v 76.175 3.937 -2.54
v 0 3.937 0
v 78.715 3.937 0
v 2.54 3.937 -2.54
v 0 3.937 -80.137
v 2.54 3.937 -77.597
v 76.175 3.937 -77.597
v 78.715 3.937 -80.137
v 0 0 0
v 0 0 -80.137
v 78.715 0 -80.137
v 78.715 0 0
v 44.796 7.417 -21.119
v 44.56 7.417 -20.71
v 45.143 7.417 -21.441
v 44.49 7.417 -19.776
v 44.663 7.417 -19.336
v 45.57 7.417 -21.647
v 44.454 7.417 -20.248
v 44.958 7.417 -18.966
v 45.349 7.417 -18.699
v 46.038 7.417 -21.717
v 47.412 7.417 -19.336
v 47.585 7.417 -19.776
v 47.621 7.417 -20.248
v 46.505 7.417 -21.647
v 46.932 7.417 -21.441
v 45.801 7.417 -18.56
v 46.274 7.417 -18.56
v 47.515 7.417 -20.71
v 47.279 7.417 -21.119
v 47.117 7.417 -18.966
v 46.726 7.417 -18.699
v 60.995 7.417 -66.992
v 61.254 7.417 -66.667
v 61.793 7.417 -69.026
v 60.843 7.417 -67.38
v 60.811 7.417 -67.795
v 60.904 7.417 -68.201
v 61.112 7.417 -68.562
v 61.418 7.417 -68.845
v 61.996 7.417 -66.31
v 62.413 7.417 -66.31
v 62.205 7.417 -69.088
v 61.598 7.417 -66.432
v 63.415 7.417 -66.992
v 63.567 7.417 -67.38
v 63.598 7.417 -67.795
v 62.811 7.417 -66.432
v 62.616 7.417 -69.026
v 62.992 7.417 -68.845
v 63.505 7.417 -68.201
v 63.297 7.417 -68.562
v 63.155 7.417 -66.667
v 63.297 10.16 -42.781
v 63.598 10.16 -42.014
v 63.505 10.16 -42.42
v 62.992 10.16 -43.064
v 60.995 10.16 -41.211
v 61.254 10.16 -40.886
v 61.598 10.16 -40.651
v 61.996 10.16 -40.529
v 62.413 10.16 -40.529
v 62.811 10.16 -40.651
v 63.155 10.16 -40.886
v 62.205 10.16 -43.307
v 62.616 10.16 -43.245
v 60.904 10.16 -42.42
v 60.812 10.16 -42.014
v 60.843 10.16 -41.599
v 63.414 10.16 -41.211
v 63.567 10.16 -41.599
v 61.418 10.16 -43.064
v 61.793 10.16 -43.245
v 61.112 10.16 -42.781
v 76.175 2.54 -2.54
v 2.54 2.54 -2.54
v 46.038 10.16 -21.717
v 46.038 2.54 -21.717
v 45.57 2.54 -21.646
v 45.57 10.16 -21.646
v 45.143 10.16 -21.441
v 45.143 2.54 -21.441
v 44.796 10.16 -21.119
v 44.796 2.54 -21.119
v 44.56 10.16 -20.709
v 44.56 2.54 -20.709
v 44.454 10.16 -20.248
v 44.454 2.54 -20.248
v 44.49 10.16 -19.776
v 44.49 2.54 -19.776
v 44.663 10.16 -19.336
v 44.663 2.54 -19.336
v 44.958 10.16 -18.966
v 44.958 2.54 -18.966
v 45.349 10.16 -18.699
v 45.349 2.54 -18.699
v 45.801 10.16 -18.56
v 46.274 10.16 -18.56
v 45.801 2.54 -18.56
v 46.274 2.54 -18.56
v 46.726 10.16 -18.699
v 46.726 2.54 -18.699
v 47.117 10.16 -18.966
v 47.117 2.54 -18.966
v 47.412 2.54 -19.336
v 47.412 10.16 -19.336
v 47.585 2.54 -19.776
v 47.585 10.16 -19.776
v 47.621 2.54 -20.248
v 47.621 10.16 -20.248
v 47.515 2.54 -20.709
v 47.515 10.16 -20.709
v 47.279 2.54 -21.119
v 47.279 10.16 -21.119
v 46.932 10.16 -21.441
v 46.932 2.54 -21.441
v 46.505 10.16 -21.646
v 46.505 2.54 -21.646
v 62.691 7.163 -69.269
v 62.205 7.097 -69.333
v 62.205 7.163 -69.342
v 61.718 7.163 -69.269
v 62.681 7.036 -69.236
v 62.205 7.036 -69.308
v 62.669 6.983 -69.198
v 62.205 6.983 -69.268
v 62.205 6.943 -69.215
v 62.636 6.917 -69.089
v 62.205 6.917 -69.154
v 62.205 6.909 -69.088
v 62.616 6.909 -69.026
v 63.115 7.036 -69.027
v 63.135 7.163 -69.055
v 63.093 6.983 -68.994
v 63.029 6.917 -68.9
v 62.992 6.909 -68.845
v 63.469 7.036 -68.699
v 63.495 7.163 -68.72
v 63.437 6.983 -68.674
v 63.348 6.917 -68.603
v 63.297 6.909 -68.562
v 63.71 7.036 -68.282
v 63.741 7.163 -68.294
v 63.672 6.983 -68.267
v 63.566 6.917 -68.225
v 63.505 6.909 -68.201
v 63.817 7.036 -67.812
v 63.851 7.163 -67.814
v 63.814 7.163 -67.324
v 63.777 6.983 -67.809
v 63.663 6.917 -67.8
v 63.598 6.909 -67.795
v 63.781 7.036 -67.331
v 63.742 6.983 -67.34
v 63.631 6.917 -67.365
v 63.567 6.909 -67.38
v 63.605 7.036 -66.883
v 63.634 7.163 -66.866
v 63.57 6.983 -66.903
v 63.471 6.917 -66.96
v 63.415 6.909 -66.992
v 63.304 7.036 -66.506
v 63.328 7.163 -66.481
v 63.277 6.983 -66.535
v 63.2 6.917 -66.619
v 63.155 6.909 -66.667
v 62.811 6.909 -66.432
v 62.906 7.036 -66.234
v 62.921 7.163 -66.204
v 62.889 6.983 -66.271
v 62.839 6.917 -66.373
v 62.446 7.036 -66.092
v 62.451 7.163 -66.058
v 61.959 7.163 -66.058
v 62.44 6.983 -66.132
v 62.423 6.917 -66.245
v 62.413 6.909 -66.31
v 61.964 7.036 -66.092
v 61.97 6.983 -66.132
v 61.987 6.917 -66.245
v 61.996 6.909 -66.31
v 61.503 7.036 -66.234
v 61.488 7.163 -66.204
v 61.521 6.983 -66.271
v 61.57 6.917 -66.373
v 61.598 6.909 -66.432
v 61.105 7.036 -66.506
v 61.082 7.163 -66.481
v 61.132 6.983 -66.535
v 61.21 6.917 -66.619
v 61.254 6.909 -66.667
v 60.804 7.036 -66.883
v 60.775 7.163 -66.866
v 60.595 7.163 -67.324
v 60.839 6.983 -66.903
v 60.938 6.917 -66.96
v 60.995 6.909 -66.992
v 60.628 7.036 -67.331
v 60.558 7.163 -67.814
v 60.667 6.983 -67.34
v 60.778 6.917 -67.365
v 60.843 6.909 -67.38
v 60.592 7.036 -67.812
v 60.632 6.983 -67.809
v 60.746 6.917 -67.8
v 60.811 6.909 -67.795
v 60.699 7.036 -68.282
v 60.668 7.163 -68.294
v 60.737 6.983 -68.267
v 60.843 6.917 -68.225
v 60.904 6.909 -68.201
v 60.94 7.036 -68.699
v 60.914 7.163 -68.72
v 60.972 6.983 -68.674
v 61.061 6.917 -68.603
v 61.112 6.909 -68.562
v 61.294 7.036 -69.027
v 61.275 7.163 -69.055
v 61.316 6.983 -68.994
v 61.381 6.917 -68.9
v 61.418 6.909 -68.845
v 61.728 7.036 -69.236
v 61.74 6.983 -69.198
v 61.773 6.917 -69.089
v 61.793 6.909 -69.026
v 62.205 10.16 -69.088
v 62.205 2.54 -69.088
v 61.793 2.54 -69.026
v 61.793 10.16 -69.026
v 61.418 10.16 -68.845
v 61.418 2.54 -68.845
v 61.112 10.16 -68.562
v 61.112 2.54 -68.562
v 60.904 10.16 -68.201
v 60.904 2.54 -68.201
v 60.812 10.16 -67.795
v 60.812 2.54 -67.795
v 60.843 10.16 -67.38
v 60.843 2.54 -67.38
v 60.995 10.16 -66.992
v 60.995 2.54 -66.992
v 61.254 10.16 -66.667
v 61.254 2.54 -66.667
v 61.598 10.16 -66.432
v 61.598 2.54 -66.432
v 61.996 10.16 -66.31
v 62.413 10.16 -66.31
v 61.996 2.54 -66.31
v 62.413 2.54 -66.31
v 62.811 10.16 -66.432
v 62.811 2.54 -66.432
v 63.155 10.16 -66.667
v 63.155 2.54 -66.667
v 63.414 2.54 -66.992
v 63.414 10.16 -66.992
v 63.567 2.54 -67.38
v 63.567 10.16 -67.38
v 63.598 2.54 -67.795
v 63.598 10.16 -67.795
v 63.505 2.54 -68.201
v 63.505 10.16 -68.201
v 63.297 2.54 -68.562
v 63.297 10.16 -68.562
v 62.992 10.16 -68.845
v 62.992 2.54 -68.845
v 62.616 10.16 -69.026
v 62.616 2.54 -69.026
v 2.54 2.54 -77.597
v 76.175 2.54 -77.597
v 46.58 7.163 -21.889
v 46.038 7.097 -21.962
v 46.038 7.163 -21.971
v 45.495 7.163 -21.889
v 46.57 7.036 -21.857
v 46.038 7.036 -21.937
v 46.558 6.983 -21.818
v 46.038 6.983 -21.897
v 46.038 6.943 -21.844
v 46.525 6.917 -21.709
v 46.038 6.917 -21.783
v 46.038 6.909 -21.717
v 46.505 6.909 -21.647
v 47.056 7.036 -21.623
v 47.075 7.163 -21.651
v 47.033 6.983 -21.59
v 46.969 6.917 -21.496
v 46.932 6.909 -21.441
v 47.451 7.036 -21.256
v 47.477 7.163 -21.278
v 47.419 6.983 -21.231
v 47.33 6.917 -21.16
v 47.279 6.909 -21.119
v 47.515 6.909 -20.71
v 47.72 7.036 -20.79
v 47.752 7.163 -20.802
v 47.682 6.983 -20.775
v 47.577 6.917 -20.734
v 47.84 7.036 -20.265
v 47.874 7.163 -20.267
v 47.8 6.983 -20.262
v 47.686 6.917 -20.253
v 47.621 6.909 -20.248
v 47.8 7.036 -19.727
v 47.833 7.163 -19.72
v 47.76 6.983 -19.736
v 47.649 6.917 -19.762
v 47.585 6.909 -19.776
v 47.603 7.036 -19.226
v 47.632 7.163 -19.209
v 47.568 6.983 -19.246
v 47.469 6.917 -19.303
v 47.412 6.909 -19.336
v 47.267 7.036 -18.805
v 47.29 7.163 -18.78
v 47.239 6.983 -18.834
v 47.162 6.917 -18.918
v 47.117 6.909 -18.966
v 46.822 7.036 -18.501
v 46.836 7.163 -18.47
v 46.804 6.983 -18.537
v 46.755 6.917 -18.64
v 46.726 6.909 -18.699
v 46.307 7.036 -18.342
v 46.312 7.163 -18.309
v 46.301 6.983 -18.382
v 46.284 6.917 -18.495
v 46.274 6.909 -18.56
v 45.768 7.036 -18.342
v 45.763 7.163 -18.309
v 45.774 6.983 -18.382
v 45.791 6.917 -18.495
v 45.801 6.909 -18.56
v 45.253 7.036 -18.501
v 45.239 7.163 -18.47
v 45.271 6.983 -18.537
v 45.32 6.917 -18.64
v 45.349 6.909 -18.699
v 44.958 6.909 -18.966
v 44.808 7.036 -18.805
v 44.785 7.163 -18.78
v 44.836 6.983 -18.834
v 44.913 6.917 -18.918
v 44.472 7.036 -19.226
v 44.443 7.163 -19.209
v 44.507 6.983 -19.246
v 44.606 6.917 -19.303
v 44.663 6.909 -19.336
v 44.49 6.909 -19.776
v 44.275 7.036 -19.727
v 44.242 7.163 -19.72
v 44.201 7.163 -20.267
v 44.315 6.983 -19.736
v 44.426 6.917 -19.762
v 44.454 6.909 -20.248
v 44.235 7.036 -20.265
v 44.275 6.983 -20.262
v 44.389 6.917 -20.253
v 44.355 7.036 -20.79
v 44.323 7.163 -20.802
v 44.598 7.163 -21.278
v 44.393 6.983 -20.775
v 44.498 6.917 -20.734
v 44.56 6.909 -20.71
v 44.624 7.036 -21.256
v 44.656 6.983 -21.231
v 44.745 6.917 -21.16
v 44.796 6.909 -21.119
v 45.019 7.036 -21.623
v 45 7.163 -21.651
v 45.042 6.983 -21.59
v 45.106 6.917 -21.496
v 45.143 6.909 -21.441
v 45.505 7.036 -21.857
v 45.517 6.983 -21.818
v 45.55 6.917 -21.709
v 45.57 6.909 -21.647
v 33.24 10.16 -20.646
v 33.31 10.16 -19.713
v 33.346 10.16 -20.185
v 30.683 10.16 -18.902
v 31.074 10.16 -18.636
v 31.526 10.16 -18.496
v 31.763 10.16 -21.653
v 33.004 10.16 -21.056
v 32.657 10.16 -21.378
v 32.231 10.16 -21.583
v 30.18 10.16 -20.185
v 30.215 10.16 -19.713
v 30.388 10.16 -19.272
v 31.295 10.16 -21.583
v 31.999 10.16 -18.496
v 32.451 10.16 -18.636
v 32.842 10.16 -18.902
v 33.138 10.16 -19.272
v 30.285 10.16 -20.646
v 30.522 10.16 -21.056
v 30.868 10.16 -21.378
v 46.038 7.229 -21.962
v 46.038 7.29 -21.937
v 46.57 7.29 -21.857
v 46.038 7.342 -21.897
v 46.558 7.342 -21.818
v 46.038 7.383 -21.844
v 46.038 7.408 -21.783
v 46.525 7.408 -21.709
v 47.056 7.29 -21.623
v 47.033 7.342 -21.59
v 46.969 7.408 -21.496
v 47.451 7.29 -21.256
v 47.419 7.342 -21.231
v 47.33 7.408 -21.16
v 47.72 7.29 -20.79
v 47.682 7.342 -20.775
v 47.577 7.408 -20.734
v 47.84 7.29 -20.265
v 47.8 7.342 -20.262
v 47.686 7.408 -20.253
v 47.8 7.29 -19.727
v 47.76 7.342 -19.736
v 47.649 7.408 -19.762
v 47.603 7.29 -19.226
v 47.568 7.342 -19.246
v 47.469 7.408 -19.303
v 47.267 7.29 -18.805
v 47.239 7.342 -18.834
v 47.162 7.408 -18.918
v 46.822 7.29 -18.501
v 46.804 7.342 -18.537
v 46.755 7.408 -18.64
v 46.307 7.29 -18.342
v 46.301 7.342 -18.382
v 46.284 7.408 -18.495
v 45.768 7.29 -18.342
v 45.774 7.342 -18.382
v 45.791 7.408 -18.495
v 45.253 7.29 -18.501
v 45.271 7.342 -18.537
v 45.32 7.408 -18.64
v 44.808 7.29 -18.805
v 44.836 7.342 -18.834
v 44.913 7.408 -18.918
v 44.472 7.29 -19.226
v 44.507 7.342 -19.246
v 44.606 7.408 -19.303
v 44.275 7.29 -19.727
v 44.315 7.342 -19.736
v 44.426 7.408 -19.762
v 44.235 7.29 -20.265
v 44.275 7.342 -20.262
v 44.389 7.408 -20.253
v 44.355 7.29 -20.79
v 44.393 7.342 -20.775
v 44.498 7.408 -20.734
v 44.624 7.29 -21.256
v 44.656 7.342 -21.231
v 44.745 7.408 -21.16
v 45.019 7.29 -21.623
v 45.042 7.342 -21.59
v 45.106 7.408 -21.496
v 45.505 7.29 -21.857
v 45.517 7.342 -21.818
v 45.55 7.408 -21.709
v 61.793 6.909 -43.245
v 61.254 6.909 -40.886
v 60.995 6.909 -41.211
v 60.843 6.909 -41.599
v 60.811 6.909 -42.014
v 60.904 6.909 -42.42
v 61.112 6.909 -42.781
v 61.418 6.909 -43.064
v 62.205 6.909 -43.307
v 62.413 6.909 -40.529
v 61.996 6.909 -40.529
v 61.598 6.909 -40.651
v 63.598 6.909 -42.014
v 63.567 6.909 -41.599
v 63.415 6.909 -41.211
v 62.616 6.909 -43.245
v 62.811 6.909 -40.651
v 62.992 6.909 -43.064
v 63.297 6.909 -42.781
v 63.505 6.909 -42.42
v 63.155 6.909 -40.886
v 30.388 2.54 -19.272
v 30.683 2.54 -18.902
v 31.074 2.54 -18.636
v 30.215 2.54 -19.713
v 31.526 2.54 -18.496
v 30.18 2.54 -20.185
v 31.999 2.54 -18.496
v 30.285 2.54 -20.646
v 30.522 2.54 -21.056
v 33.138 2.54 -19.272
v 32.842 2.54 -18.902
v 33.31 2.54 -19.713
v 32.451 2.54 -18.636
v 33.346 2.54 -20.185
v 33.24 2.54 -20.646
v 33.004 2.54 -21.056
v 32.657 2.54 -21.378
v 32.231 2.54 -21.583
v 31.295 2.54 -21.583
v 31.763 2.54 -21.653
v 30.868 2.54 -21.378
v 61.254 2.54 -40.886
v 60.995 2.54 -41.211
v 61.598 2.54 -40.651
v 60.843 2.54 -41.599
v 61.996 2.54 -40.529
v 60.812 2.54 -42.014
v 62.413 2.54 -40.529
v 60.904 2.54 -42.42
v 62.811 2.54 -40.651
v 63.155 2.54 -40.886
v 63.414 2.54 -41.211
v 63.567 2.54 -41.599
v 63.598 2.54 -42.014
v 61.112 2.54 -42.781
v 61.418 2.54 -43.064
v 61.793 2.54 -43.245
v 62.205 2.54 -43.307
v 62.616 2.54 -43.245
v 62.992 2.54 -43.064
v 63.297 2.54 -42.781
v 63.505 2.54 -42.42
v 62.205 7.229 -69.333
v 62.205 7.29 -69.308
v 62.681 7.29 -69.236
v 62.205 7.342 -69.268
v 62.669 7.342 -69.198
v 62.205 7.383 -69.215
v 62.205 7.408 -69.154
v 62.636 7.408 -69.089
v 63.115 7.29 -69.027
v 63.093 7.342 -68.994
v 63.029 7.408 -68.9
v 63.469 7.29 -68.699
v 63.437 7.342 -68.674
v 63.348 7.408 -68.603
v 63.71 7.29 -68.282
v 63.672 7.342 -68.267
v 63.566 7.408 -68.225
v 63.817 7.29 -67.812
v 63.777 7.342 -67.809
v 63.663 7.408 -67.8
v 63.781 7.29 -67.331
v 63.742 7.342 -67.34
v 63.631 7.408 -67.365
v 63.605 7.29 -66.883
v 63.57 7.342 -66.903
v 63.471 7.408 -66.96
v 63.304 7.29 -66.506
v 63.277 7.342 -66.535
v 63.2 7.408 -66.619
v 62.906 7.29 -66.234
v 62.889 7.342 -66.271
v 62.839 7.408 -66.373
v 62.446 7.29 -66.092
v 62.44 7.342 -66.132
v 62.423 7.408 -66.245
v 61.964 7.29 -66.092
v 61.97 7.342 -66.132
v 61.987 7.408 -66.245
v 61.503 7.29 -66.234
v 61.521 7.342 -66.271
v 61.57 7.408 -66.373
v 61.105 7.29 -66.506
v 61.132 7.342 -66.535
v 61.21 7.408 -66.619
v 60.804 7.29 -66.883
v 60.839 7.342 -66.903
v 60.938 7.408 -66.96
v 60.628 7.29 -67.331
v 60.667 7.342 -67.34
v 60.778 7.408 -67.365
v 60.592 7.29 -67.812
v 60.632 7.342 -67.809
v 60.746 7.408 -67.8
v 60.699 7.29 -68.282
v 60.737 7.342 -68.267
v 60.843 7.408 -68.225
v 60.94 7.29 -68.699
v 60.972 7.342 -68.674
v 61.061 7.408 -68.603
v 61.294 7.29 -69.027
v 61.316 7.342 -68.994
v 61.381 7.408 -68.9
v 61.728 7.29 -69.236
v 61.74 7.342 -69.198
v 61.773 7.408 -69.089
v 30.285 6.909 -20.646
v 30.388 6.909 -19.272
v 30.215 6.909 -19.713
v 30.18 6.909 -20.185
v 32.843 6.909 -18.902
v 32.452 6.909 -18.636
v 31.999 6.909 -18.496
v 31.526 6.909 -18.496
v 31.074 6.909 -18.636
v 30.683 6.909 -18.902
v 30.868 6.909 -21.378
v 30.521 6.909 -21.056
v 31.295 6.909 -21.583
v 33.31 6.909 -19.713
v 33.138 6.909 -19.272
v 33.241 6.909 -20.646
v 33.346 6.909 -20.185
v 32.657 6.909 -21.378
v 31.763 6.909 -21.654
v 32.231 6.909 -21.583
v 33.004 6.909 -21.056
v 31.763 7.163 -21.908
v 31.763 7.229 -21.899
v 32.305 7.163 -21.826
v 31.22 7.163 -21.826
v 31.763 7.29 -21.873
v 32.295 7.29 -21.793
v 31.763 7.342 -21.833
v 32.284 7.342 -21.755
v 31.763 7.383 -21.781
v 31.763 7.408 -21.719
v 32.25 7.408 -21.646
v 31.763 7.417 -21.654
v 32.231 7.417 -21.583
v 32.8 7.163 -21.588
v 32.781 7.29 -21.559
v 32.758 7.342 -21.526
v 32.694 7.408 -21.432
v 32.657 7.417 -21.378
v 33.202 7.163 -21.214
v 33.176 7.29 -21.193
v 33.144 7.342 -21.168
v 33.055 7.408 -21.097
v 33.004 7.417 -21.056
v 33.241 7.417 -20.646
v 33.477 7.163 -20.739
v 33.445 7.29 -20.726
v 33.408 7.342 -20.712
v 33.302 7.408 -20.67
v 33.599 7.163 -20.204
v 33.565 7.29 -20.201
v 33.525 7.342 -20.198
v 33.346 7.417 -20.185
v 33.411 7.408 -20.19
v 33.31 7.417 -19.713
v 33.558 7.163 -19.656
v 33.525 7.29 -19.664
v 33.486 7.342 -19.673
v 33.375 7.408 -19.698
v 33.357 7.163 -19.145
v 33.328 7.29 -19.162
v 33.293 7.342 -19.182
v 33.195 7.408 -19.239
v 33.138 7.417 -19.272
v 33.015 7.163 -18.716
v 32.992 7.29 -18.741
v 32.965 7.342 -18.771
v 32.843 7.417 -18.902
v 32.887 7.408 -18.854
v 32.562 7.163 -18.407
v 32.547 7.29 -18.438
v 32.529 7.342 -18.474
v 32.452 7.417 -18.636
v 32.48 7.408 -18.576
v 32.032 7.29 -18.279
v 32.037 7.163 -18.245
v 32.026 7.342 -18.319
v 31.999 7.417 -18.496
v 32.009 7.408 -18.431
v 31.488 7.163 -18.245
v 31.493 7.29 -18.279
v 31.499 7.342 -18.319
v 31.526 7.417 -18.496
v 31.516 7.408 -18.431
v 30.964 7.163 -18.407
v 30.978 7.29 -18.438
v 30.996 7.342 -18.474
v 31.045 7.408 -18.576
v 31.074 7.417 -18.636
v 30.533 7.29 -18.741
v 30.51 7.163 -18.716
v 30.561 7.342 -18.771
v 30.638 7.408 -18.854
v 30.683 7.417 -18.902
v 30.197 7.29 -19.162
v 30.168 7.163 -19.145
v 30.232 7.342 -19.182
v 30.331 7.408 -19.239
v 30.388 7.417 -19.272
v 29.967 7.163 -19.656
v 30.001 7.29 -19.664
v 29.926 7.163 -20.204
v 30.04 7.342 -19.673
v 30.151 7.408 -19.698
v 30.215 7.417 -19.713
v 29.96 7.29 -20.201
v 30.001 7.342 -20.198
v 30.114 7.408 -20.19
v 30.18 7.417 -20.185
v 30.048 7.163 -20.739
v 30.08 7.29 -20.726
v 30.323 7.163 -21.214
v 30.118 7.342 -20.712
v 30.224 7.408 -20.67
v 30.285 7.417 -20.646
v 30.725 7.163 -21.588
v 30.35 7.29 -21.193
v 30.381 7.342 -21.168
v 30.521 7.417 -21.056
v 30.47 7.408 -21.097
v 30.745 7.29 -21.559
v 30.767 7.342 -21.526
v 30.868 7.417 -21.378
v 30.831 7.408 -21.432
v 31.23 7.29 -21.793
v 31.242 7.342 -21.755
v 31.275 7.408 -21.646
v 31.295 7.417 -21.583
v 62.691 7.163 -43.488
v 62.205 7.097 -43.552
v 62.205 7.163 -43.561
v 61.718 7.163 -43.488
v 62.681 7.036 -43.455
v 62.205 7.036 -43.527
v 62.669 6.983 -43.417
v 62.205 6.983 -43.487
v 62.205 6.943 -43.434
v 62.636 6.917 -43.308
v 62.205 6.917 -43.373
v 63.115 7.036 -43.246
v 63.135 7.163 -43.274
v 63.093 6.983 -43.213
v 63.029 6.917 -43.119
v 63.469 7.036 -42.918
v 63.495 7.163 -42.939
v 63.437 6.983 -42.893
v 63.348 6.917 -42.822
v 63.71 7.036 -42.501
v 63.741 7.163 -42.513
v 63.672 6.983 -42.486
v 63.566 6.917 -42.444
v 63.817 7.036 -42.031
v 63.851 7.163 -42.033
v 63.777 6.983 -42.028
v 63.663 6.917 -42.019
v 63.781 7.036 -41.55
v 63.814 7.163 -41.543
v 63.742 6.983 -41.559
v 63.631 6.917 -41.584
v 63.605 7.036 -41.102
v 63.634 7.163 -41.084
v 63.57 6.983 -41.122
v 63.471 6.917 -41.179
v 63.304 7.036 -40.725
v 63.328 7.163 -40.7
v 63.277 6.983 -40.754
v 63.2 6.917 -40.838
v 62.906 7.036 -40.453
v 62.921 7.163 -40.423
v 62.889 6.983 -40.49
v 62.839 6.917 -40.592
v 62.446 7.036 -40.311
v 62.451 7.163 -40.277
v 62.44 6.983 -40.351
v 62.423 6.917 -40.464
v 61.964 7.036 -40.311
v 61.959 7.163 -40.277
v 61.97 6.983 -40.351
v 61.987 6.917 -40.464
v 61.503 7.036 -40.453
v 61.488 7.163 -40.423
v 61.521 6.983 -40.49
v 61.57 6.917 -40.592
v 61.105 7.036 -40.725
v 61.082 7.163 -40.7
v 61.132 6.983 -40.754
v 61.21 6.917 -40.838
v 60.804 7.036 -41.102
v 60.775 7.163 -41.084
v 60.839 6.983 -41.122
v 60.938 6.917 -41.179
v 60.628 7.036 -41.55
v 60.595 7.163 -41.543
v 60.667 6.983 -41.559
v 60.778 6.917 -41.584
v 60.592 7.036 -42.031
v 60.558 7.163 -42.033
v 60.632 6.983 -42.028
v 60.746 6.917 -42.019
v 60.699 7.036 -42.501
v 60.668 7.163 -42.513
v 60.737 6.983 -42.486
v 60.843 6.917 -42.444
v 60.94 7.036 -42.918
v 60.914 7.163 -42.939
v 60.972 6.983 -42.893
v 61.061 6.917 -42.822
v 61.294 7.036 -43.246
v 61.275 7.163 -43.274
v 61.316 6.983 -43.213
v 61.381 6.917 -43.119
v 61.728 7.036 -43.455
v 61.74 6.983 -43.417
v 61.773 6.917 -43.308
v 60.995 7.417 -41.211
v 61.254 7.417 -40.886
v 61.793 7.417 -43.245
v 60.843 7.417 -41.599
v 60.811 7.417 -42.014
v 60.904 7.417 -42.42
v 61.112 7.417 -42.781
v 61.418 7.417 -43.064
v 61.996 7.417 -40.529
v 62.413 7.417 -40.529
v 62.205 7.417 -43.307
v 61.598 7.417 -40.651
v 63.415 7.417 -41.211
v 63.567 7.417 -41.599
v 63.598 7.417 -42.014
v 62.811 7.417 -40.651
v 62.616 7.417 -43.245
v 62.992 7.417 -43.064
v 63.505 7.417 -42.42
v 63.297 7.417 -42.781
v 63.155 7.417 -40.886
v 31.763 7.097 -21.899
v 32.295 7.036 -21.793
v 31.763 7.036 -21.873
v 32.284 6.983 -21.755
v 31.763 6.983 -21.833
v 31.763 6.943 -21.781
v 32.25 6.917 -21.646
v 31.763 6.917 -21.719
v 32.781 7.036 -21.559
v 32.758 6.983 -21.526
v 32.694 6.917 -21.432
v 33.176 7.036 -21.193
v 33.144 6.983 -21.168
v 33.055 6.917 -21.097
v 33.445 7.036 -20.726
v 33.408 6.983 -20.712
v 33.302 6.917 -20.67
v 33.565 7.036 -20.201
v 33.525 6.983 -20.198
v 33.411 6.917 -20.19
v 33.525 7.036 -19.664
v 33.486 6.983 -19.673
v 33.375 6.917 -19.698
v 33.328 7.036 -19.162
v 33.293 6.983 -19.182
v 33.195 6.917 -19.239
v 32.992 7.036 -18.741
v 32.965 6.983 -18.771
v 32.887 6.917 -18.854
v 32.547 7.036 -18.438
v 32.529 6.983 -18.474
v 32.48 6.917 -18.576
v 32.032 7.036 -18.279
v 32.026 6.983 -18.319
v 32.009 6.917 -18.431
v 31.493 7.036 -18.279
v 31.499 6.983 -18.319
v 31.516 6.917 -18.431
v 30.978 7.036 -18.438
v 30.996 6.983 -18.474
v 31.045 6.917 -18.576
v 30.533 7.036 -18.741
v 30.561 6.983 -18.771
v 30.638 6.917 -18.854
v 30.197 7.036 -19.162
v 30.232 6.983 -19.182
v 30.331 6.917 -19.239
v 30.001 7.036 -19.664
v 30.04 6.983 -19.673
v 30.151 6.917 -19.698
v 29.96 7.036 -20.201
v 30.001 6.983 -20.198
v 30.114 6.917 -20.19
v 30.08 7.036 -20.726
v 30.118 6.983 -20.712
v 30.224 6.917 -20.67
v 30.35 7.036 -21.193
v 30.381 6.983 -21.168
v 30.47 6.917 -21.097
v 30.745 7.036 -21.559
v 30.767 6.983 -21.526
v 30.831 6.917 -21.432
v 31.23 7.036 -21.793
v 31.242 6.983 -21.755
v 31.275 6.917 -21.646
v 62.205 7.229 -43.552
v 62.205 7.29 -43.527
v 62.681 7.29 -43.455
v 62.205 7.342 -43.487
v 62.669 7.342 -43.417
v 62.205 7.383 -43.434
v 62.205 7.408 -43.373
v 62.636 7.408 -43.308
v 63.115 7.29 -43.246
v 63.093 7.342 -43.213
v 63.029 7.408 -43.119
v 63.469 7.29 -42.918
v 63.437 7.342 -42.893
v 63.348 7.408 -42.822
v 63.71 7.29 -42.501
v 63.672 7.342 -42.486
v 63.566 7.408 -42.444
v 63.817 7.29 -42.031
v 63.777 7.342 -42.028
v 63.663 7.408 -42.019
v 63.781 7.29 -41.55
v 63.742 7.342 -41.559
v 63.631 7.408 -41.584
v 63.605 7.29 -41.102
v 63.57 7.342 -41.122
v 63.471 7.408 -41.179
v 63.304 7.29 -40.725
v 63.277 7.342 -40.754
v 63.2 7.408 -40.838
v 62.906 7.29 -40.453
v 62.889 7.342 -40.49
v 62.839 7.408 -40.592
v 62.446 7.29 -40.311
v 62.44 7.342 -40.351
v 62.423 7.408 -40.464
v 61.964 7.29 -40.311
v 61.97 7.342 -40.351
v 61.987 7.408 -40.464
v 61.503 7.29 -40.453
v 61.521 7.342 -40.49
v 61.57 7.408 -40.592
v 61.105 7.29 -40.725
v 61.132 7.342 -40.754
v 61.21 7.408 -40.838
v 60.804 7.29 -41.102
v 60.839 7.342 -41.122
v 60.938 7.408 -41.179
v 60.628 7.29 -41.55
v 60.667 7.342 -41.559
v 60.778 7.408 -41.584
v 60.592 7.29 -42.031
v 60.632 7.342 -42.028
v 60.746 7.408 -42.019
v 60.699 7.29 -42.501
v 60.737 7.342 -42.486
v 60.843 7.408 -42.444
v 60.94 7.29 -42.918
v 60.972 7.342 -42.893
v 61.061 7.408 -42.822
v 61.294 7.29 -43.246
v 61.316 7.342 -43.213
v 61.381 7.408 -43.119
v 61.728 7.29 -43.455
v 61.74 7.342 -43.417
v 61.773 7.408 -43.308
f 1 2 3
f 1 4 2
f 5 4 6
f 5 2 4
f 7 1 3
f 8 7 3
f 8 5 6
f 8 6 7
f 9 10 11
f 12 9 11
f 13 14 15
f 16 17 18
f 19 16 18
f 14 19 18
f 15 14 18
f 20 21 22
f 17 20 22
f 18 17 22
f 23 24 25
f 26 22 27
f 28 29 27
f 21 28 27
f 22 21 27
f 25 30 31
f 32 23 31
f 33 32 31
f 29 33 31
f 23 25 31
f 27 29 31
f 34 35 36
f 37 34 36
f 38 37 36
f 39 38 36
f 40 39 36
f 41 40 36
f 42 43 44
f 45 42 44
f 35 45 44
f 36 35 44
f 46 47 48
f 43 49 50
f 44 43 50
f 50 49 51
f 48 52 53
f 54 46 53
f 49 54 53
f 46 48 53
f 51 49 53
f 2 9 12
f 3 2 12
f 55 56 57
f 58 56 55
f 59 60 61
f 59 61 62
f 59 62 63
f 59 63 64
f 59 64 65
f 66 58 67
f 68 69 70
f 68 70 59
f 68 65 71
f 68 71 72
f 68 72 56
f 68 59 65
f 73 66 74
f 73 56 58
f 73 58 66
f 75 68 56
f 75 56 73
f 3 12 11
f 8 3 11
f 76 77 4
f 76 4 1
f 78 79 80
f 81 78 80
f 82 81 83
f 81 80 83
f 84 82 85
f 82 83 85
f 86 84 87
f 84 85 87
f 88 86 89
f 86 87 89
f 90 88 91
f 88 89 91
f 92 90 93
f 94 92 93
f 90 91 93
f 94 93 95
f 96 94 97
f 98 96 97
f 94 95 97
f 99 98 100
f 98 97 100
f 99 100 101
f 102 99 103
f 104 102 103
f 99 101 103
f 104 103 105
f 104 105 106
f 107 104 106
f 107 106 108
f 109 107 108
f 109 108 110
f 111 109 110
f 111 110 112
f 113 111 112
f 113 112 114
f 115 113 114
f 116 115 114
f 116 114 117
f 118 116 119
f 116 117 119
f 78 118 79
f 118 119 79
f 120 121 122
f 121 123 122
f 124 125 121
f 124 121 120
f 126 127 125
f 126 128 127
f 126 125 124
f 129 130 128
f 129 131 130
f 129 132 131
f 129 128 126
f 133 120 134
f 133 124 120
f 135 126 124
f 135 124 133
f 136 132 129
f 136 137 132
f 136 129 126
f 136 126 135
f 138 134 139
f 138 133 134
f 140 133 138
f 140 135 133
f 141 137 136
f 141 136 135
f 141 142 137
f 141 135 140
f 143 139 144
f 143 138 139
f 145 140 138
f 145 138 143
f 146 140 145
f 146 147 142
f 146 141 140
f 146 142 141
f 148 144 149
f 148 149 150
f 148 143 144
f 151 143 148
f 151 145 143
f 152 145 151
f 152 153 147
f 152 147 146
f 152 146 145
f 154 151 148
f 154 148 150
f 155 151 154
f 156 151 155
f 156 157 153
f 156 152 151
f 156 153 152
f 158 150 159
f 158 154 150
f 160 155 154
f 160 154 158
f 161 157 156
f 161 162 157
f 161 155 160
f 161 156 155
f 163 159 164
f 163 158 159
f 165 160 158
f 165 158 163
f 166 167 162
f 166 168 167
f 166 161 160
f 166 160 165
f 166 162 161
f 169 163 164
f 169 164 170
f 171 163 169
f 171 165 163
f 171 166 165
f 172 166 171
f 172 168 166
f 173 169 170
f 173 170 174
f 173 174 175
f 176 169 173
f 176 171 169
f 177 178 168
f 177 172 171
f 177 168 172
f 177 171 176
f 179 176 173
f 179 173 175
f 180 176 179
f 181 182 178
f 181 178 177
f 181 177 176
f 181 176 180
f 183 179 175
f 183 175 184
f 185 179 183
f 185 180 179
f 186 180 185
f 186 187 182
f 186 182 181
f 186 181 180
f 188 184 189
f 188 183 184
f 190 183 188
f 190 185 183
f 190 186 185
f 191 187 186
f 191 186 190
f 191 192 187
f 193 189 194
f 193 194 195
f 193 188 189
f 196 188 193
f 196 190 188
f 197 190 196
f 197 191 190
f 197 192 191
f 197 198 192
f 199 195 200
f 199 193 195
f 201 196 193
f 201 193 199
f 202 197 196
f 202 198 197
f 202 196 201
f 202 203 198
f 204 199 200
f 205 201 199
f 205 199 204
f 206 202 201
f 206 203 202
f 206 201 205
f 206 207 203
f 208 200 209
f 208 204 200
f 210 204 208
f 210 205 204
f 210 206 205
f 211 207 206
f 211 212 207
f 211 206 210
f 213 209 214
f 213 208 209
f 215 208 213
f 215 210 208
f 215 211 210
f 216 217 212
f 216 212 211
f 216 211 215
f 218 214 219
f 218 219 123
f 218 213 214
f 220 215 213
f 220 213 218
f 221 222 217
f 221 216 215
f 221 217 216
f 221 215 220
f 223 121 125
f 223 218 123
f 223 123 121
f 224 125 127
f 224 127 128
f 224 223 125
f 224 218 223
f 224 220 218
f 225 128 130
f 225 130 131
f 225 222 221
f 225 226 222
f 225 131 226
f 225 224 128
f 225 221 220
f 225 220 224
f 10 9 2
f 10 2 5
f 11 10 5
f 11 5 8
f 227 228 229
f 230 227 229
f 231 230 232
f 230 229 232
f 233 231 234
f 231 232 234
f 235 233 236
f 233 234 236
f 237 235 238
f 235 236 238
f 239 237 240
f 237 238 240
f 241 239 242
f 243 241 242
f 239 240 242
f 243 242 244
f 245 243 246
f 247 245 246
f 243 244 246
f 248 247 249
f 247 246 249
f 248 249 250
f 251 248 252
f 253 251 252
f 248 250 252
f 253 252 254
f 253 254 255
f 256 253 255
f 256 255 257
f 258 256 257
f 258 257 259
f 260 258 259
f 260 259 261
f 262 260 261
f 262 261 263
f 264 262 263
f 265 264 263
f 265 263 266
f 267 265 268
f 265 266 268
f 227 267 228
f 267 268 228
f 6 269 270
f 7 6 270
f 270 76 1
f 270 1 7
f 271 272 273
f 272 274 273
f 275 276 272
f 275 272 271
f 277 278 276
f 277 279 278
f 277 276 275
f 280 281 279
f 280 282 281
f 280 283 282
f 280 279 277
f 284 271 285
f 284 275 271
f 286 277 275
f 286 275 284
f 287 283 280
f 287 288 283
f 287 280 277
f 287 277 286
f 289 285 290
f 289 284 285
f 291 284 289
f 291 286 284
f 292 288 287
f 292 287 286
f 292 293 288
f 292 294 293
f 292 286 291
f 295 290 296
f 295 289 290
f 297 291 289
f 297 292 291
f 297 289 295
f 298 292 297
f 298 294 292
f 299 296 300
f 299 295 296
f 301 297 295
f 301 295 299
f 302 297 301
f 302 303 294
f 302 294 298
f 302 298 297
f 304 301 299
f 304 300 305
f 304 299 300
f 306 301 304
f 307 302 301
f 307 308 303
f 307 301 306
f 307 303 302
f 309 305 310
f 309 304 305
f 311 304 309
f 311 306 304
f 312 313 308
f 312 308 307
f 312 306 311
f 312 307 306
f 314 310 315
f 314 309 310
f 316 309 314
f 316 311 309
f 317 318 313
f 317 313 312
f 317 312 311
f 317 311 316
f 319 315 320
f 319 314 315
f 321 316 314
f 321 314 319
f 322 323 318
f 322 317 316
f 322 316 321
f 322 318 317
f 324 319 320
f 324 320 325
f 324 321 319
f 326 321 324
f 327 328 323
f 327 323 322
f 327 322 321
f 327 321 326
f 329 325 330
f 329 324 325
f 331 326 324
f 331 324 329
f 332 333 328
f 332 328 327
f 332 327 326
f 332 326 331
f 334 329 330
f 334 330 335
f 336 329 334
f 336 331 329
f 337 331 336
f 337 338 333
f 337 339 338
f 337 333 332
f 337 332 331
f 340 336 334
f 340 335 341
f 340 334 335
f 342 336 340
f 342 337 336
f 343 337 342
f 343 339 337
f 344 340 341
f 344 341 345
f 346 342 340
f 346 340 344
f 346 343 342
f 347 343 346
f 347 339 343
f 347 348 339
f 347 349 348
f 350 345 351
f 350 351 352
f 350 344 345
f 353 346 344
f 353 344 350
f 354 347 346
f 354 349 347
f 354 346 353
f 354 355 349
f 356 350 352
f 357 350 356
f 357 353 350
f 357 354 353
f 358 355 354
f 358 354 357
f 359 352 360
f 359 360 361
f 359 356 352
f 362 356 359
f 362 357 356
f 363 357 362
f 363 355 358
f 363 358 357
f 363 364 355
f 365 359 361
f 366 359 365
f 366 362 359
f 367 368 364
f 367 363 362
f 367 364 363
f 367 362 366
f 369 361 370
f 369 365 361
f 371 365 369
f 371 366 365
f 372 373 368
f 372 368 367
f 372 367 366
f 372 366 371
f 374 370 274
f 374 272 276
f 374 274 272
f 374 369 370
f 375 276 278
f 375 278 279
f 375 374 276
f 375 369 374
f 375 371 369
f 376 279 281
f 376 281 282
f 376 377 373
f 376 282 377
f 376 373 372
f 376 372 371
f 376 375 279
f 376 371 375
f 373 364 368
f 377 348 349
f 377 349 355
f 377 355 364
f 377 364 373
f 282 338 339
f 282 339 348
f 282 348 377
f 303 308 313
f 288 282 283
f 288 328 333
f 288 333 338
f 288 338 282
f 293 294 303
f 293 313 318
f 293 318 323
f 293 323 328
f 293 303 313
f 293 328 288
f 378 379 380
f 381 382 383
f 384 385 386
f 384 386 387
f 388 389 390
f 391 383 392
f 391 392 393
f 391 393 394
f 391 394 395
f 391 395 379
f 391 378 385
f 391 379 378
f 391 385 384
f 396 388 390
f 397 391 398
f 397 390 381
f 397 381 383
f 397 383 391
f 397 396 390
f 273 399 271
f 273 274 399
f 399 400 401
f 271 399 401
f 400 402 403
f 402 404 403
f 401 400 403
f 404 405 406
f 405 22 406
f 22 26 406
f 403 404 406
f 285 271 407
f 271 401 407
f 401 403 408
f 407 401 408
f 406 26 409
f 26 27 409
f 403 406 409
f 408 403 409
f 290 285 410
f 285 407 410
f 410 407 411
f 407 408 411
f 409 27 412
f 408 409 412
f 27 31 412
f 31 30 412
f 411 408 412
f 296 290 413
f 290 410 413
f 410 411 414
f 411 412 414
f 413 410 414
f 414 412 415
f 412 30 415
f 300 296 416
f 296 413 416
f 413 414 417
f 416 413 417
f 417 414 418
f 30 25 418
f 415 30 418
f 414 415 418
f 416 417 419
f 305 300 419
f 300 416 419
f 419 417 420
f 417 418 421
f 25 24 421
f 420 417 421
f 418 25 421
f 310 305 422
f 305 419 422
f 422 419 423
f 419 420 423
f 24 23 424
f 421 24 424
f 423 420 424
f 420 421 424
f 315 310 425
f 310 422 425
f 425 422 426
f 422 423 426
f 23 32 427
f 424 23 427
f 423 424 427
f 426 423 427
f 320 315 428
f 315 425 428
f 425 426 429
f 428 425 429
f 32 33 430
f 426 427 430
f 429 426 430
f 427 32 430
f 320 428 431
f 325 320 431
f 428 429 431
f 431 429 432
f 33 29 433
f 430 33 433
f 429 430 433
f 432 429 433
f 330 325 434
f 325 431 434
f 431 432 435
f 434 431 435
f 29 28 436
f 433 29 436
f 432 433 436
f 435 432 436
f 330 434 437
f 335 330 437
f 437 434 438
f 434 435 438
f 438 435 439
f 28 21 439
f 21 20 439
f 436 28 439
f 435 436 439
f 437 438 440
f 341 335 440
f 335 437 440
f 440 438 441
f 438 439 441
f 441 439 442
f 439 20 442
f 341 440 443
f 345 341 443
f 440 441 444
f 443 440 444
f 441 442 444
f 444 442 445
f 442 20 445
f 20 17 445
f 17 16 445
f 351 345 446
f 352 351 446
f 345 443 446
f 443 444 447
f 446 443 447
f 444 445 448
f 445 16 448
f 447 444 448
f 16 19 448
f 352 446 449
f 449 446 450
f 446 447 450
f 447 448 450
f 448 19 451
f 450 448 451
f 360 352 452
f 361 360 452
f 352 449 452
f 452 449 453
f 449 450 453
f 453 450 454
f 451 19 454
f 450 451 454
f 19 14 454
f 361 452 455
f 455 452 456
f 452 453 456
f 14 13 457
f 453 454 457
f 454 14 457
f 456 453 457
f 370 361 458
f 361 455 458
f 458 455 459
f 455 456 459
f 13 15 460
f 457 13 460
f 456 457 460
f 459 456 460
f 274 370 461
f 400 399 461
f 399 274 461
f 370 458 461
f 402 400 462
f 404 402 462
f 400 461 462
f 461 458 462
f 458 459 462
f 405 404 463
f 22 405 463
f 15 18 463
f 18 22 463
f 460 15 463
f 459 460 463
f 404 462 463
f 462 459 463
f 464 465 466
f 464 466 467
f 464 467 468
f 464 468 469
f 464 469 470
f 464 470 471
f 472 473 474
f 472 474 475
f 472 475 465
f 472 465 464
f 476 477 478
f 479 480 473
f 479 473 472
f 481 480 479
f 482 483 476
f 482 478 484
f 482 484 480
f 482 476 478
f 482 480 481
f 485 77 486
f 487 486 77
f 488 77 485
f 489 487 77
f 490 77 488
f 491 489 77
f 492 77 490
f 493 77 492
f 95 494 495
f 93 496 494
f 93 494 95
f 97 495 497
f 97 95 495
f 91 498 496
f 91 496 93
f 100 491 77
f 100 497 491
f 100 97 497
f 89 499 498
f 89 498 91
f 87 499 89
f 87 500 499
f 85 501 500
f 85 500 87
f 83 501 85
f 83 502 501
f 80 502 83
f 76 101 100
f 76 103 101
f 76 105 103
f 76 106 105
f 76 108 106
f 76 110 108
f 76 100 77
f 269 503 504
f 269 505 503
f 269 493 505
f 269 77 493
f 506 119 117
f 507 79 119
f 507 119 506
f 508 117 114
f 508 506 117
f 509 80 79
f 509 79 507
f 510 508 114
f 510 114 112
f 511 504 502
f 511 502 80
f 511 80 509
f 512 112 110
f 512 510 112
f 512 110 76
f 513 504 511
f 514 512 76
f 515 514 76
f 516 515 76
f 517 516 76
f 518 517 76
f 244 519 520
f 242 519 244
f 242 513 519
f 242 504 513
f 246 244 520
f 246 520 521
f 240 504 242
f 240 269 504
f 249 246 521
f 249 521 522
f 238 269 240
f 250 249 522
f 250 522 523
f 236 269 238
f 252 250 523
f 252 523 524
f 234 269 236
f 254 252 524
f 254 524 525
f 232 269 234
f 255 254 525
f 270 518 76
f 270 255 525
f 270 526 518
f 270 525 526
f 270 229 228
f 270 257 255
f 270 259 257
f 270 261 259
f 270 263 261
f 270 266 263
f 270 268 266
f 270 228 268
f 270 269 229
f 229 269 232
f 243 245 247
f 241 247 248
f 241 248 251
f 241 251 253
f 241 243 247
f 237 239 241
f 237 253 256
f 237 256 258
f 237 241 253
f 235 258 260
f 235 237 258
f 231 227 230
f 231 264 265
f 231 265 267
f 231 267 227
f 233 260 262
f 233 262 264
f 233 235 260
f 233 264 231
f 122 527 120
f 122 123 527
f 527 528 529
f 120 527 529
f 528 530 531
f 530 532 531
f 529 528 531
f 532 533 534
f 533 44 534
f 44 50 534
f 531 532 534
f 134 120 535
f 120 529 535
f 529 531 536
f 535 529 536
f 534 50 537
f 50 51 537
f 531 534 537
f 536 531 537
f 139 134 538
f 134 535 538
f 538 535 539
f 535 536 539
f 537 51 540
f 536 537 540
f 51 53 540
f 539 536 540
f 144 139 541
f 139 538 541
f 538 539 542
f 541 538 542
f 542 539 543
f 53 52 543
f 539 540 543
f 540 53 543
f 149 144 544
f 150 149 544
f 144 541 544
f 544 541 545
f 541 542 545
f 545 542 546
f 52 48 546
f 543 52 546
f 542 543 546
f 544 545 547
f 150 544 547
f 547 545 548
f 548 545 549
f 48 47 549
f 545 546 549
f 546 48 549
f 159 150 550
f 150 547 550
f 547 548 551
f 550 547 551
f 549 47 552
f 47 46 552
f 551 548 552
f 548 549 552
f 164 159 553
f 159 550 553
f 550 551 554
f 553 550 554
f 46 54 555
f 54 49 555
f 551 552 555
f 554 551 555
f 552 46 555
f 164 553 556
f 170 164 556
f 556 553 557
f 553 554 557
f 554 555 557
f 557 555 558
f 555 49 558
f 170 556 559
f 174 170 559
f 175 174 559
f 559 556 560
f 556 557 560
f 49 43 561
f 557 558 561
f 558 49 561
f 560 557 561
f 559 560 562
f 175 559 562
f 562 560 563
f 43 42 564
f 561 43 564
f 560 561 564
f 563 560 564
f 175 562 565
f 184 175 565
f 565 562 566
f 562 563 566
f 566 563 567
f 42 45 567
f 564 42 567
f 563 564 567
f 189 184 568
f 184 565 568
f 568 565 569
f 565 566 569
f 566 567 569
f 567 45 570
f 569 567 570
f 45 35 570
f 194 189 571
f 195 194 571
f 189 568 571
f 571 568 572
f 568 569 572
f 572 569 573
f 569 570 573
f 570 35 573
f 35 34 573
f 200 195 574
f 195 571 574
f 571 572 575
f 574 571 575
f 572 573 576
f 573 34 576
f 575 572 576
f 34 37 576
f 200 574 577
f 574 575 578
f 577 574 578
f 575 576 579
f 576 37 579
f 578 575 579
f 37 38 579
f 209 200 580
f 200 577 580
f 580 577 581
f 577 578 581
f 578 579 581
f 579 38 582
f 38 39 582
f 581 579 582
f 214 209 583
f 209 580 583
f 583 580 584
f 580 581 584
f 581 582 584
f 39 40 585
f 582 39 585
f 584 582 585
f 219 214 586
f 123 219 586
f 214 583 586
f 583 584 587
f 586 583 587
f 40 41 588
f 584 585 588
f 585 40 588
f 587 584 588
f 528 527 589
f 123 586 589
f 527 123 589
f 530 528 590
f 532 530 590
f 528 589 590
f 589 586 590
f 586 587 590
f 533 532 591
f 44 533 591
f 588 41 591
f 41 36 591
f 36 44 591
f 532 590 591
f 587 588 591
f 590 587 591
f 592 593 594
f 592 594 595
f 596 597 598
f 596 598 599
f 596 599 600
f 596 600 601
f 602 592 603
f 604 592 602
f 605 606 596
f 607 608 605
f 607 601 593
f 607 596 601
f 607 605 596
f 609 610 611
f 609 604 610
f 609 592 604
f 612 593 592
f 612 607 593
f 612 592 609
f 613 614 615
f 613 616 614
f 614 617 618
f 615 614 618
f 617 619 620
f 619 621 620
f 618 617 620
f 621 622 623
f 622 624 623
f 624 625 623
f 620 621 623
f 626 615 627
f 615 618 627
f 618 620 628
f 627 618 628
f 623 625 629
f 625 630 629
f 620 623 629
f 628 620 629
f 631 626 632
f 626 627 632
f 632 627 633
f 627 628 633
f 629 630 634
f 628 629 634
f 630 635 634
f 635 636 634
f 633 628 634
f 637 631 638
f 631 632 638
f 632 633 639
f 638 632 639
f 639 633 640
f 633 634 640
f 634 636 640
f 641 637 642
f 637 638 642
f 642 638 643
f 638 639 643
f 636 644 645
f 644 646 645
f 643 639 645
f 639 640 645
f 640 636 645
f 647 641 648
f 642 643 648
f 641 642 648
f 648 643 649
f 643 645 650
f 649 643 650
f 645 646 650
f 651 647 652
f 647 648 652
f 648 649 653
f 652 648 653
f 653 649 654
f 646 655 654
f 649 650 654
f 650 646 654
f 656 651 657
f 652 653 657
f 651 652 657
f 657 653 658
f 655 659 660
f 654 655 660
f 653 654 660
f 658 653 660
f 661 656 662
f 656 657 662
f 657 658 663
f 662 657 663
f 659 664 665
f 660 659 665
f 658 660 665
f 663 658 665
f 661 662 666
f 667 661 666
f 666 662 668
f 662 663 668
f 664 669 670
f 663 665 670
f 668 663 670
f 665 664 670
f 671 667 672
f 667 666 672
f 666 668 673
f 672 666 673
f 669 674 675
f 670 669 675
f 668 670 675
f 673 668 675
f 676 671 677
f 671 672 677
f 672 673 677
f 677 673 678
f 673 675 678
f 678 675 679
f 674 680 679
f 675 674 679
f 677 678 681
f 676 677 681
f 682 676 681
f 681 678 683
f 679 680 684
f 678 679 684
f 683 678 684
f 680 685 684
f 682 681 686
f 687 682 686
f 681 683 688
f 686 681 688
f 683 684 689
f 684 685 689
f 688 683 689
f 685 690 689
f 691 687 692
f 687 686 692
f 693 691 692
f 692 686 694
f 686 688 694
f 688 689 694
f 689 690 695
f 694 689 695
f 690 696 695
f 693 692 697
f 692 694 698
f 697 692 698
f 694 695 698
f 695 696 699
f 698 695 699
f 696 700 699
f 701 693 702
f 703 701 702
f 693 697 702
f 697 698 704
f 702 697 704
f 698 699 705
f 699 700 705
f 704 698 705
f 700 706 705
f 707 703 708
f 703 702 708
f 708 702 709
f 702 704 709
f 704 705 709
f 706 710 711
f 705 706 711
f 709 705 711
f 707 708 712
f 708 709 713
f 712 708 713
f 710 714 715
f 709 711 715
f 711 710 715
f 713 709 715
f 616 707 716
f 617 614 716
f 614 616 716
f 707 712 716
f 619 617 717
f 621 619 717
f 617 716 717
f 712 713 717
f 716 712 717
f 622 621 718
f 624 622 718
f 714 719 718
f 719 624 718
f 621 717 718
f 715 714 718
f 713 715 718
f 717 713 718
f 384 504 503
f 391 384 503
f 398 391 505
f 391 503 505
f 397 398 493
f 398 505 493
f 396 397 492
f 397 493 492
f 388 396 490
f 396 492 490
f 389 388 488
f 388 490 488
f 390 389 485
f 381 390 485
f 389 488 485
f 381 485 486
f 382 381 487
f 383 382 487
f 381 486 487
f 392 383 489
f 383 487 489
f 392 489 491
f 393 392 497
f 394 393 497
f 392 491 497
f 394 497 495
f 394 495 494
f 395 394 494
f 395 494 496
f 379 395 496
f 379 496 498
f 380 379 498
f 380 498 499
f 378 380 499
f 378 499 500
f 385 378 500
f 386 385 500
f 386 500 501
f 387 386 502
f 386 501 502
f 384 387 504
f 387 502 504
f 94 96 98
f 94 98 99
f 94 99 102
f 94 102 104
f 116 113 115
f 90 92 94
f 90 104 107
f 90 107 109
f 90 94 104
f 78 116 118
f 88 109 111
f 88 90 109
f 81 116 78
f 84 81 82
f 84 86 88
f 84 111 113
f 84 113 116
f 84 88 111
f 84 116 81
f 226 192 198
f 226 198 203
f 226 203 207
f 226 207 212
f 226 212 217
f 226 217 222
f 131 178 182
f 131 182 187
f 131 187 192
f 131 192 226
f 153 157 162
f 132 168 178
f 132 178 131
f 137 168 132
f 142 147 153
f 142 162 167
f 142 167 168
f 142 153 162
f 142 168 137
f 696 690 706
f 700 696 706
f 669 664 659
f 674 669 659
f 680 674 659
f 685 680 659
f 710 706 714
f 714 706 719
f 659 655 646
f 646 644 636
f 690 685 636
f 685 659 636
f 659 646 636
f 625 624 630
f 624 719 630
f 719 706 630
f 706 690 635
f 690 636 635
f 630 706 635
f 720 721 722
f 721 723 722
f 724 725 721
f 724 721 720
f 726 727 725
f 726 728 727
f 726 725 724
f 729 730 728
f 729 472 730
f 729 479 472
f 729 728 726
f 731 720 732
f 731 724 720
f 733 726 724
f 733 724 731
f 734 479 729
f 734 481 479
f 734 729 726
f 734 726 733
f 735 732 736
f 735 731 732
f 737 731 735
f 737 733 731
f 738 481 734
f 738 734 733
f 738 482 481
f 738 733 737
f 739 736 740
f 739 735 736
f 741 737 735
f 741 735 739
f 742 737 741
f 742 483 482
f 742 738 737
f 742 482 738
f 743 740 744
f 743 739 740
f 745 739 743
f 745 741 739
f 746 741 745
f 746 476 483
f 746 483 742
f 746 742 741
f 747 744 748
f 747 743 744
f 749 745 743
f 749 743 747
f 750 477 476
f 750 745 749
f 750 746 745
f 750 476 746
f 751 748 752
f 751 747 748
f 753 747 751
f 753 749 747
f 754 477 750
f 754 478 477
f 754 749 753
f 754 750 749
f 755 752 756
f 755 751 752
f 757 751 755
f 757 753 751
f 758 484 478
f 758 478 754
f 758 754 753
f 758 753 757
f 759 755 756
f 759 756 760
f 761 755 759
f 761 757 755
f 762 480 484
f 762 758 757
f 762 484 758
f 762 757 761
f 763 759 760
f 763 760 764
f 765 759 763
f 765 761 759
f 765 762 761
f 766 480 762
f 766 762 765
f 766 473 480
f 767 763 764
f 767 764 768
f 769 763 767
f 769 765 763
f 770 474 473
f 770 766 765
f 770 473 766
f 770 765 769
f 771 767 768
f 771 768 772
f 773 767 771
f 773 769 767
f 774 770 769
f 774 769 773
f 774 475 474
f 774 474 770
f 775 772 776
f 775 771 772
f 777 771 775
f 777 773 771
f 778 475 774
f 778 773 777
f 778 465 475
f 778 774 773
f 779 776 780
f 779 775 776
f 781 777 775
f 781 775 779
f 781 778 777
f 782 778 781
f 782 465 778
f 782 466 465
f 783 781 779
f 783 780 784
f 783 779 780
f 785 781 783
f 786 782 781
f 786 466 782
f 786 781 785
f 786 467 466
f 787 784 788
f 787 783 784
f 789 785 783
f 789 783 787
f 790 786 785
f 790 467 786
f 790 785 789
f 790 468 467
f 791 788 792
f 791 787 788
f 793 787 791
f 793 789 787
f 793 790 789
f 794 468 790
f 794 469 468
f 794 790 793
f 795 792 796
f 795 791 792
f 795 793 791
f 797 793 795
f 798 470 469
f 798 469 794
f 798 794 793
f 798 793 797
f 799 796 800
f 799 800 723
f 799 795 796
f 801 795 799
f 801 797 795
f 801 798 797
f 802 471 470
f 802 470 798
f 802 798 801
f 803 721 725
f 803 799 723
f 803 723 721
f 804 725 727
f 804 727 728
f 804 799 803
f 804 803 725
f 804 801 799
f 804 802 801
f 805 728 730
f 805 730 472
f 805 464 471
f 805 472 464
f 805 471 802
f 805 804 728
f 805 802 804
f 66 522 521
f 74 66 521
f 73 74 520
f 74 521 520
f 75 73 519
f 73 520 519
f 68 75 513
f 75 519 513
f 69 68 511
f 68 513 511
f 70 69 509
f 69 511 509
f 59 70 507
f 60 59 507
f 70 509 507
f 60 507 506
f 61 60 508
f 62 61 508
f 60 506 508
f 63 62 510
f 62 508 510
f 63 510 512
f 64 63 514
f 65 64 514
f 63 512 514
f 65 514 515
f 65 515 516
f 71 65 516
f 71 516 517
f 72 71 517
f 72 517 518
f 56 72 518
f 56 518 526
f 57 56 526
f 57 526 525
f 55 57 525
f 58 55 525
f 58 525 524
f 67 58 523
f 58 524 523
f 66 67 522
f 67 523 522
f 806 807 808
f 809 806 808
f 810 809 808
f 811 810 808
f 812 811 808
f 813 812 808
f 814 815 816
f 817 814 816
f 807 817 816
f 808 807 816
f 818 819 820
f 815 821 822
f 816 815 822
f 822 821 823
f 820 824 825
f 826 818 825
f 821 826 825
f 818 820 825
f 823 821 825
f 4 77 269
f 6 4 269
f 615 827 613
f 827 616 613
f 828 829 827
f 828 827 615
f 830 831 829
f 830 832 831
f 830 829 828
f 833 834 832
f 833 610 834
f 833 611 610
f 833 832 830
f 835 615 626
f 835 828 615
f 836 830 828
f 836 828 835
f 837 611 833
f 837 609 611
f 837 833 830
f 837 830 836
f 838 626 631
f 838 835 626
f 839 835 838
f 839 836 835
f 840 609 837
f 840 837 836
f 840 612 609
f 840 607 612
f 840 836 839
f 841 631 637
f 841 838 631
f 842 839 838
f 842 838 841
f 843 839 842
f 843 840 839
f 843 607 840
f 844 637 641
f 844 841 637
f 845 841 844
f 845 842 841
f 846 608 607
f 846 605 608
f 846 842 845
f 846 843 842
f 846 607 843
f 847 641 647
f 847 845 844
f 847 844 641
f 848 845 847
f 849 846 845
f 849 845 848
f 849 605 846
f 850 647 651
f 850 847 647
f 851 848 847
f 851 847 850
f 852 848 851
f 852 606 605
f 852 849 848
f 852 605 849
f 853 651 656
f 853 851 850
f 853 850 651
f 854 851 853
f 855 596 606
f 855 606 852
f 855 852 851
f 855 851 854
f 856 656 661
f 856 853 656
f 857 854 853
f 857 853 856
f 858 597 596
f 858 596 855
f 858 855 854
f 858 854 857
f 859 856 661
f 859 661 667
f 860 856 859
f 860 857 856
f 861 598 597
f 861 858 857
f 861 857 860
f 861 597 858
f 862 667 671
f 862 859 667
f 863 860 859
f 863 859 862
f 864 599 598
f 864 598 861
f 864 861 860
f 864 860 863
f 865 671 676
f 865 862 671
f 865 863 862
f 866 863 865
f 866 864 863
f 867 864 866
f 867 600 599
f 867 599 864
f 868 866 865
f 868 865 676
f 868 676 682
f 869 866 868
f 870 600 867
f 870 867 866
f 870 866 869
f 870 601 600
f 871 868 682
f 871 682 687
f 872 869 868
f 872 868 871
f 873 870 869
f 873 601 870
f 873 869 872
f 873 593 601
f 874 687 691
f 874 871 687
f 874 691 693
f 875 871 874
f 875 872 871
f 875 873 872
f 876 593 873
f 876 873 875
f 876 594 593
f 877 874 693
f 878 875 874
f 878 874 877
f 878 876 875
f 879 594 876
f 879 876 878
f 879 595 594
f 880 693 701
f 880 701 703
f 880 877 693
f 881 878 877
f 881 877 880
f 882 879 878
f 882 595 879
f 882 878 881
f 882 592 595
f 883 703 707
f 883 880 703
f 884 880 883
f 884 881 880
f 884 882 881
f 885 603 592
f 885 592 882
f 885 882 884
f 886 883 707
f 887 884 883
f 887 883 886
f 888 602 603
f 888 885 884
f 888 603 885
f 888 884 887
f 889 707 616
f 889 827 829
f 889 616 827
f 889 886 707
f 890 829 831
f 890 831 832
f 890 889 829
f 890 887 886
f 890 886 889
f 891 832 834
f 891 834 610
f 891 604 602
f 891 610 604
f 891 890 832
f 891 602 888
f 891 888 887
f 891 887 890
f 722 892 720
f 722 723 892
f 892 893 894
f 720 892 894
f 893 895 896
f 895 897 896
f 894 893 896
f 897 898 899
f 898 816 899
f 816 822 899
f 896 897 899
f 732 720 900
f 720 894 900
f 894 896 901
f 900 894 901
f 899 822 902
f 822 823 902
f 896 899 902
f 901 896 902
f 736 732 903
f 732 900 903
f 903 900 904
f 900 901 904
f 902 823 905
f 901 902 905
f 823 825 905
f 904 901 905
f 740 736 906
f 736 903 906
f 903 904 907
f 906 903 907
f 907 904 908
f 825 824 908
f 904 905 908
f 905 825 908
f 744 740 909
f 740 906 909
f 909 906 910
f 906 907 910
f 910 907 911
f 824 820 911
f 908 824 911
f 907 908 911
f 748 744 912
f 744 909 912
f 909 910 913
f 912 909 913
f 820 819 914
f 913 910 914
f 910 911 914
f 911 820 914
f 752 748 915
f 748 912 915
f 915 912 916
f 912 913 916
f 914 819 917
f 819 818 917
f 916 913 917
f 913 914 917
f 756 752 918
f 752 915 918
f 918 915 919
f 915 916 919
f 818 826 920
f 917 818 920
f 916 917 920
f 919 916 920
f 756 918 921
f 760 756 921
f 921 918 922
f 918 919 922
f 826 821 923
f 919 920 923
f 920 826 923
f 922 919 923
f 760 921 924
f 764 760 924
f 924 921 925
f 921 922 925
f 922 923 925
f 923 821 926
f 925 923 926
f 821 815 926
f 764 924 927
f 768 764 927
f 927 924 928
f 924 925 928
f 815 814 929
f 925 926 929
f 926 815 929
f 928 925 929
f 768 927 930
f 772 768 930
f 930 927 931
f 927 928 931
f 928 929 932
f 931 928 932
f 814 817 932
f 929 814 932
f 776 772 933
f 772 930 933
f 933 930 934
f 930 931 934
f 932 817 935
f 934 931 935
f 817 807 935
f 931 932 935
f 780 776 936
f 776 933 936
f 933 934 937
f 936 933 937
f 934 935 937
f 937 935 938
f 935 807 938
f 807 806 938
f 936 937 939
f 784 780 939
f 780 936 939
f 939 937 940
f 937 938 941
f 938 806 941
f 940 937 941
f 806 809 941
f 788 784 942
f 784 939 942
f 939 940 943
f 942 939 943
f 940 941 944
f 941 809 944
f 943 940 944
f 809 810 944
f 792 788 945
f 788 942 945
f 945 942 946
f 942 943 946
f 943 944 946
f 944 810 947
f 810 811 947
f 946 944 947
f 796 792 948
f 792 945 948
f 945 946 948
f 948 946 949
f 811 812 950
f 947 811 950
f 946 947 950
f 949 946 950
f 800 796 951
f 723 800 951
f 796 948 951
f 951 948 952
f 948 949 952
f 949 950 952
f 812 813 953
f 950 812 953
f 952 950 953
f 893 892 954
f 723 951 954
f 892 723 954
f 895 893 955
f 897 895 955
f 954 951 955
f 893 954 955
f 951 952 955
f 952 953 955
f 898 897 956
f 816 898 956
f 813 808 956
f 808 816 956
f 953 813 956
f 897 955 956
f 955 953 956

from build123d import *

# Parameters (mm, degrees)
SKETCH3_W             = 78.7146
SKETCH3_H             = 80.137
BOSS_EXTRUDE1_DEPTH   = 3.937
SHELL1_T              = -2.54
SKETCH4_R             = 1.397
SKETCH4_R_2           = 1.5875
BOSS_EXTRUDE2_DEPTH   = 7.62
SKETCH7_R             = 1.8415
BOSS_EXTRUDE3_DEPTH   = 0.508
BOSS_EXTRUDE3_2_DEPTH = 0.508
SKETCH7_R_2           = 1.651
BOSS_EXTRUDE3_3_DEPTH = 0.508
BOSS_EXTRUDE3_4_DEPTH = 0.508
FILLET1_R             = 0.254
FILLET2_R             = 0.254
FILLET4_R             = 0.254
FILLET5_R             = 0.254


with BuildPart() as part:
    # Sketch3 → Boss-Extrude1 (new body)
    with BuildSketch(Plane(origin=(0, 0, 0), x_dir=(1, 0, 0), z_dir=(0, 1, 0))):
        with Locations((39.3573, 40.0685)):
            Rectangle(SKETCH3_W, SKETCH3_H)
    extrude(amount=BOSS_EXTRUDE1_DEPTH)

    # Shell1
    shell1_openings = [part.faces().sort_by_distance(p)[0] for p in [
        (39.3573, 3.937, -40.0685),
    ]]
    offset(amount=SHELL1_T, openings=shell1_openings, kind=Kind.INTERSECTION)

    # Sketch4 → Boss-Extrude2 (add)
    with BuildSketch(Plane(origin=(0, 2.54, 0), x_dir=(1, 0, 0), z_dir=(0, 1, 0))):
        with Locations(Location((62.2046, 67.691, 0), (0, 0, 90))):
            Circle(SKETCH4_R)
        with Locations(Location((62.2046, 41.91, 0), (0, 0, 90))):
            Circle(SKETCH4_R)
        with Locations(Location((46.0375, 20.1295, 0), (0, 0, 90))):
            Circle(SKETCH4_R_2)
        with Locations(Location((31.7627, 20.066, 0), (0, 0, 90))):
            Circle(SKETCH4_R_2)
    extrude(amount=BOSS_EXTRUDE2_DEPTH)


with BuildPart() as body_2:
    # Sketch7 → Boss-Extrude3 (new body)
    with BuildSketch(Plane(origin=(0, 6.9088, 0), x_dir=(-1, 0, 0), z_dir=(0, -1, 0))):
        with Locations(Location((-31.7627, 20.066, 0), (0, 0, 90))):
            Circle(SKETCH7_R)
    extrude(amount=-BOSS_EXTRUDE3_DEPTH)

    # Fillet2
    fillet2_edges = [body_2.edges().sort_by_distance(p)[0] for p in [
        (31.7627, 6.9088, -18.2245),
        (31.7627, 7.4168, -18.2245),
    ]]
    fillet(fillet2_edges, radius=FILLET2_R - 0.0001)  # a hair under: the kernel refuses the full size


with BuildPart() as body_3:
    # Sketch7 → Boss-Extrude3 2 (new body)
    with BuildSketch(Plane(origin=(0, 6.9088, 0), x_dir=(-1, 0, 0), z_dir=(0, -1, 0))):
        with Locations(Location((-46.0375, 20.1295, 0), (0, 0, 90))):
            Circle(SKETCH7_R)
    extrude(amount=-BOSS_EXTRUDE3_2_DEPTH)

    # Fillet1
    fillet1_edges = [body_3.edges().sort_by_distance(p)[0] for p in [
        (46.0375, 6.9088, -18.288),
        (46.0375, 7.4168, -18.288),
    ]]
    fillet(fillet1_edges, radius=FILLET1_R - 0.0001)  # a hair under: the kernel refuses the full size


with BuildPart() as body_4:
    # Sketch7 → Boss-Extrude3 3 (new body)
    with BuildSketch(Plane(origin=(0, 6.9088, 0), x_dir=(-1, 0, 0), z_dir=(0, -1, 0))):
        with Locations(Location((-62.2046, 41.91, 0), (0, 0, 90))):
            Circle(SKETCH7_R_2)
    extrude(amount=-BOSS_EXTRUDE3_3_DEPTH)

    # Fillet4
    fillet4_edges = [body_4.edges().sort_by_distance(p)[0] for p in [
        (62.2046, 6.9088, -40.259),
        (62.2046, 7.4168, -40.259),
    ]]
    fillet(fillet4_edges, radius=FILLET4_R - 0.0001)  # a hair under: the kernel refuses the full size


with BuildPart() as body_5:
    # Sketch7 → Boss-Extrude3 4 (new body)
    with BuildSketch(Plane(origin=(0, 6.9088, 0), x_dir=(-1, 0, 0), z_dir=(0, -1, 0))):
        with Locations(Location((-62.2046, 67.691, 0), (0, 0, 90))):
            Circle(SKETCH7_R_2)
    extrude(amount=-BOSS_EXTRUDE3_4_DEPTH)

    # Fillet5
    fillet5_edges = [body_5.edges().sort_by_distance(p)[0] for p in [
        (62.2046, 6.9088, -66.04),
        (62.2046, 7.4168, -66.04),
    ]]
    fillet(fillet5_edges, radius=FILLET5_R - 0.0001)  # a hair under: the kernel refuses the full size


solid = Compound([part.part, body_2.part, body_3.part, body_4.part, body_5.part])
